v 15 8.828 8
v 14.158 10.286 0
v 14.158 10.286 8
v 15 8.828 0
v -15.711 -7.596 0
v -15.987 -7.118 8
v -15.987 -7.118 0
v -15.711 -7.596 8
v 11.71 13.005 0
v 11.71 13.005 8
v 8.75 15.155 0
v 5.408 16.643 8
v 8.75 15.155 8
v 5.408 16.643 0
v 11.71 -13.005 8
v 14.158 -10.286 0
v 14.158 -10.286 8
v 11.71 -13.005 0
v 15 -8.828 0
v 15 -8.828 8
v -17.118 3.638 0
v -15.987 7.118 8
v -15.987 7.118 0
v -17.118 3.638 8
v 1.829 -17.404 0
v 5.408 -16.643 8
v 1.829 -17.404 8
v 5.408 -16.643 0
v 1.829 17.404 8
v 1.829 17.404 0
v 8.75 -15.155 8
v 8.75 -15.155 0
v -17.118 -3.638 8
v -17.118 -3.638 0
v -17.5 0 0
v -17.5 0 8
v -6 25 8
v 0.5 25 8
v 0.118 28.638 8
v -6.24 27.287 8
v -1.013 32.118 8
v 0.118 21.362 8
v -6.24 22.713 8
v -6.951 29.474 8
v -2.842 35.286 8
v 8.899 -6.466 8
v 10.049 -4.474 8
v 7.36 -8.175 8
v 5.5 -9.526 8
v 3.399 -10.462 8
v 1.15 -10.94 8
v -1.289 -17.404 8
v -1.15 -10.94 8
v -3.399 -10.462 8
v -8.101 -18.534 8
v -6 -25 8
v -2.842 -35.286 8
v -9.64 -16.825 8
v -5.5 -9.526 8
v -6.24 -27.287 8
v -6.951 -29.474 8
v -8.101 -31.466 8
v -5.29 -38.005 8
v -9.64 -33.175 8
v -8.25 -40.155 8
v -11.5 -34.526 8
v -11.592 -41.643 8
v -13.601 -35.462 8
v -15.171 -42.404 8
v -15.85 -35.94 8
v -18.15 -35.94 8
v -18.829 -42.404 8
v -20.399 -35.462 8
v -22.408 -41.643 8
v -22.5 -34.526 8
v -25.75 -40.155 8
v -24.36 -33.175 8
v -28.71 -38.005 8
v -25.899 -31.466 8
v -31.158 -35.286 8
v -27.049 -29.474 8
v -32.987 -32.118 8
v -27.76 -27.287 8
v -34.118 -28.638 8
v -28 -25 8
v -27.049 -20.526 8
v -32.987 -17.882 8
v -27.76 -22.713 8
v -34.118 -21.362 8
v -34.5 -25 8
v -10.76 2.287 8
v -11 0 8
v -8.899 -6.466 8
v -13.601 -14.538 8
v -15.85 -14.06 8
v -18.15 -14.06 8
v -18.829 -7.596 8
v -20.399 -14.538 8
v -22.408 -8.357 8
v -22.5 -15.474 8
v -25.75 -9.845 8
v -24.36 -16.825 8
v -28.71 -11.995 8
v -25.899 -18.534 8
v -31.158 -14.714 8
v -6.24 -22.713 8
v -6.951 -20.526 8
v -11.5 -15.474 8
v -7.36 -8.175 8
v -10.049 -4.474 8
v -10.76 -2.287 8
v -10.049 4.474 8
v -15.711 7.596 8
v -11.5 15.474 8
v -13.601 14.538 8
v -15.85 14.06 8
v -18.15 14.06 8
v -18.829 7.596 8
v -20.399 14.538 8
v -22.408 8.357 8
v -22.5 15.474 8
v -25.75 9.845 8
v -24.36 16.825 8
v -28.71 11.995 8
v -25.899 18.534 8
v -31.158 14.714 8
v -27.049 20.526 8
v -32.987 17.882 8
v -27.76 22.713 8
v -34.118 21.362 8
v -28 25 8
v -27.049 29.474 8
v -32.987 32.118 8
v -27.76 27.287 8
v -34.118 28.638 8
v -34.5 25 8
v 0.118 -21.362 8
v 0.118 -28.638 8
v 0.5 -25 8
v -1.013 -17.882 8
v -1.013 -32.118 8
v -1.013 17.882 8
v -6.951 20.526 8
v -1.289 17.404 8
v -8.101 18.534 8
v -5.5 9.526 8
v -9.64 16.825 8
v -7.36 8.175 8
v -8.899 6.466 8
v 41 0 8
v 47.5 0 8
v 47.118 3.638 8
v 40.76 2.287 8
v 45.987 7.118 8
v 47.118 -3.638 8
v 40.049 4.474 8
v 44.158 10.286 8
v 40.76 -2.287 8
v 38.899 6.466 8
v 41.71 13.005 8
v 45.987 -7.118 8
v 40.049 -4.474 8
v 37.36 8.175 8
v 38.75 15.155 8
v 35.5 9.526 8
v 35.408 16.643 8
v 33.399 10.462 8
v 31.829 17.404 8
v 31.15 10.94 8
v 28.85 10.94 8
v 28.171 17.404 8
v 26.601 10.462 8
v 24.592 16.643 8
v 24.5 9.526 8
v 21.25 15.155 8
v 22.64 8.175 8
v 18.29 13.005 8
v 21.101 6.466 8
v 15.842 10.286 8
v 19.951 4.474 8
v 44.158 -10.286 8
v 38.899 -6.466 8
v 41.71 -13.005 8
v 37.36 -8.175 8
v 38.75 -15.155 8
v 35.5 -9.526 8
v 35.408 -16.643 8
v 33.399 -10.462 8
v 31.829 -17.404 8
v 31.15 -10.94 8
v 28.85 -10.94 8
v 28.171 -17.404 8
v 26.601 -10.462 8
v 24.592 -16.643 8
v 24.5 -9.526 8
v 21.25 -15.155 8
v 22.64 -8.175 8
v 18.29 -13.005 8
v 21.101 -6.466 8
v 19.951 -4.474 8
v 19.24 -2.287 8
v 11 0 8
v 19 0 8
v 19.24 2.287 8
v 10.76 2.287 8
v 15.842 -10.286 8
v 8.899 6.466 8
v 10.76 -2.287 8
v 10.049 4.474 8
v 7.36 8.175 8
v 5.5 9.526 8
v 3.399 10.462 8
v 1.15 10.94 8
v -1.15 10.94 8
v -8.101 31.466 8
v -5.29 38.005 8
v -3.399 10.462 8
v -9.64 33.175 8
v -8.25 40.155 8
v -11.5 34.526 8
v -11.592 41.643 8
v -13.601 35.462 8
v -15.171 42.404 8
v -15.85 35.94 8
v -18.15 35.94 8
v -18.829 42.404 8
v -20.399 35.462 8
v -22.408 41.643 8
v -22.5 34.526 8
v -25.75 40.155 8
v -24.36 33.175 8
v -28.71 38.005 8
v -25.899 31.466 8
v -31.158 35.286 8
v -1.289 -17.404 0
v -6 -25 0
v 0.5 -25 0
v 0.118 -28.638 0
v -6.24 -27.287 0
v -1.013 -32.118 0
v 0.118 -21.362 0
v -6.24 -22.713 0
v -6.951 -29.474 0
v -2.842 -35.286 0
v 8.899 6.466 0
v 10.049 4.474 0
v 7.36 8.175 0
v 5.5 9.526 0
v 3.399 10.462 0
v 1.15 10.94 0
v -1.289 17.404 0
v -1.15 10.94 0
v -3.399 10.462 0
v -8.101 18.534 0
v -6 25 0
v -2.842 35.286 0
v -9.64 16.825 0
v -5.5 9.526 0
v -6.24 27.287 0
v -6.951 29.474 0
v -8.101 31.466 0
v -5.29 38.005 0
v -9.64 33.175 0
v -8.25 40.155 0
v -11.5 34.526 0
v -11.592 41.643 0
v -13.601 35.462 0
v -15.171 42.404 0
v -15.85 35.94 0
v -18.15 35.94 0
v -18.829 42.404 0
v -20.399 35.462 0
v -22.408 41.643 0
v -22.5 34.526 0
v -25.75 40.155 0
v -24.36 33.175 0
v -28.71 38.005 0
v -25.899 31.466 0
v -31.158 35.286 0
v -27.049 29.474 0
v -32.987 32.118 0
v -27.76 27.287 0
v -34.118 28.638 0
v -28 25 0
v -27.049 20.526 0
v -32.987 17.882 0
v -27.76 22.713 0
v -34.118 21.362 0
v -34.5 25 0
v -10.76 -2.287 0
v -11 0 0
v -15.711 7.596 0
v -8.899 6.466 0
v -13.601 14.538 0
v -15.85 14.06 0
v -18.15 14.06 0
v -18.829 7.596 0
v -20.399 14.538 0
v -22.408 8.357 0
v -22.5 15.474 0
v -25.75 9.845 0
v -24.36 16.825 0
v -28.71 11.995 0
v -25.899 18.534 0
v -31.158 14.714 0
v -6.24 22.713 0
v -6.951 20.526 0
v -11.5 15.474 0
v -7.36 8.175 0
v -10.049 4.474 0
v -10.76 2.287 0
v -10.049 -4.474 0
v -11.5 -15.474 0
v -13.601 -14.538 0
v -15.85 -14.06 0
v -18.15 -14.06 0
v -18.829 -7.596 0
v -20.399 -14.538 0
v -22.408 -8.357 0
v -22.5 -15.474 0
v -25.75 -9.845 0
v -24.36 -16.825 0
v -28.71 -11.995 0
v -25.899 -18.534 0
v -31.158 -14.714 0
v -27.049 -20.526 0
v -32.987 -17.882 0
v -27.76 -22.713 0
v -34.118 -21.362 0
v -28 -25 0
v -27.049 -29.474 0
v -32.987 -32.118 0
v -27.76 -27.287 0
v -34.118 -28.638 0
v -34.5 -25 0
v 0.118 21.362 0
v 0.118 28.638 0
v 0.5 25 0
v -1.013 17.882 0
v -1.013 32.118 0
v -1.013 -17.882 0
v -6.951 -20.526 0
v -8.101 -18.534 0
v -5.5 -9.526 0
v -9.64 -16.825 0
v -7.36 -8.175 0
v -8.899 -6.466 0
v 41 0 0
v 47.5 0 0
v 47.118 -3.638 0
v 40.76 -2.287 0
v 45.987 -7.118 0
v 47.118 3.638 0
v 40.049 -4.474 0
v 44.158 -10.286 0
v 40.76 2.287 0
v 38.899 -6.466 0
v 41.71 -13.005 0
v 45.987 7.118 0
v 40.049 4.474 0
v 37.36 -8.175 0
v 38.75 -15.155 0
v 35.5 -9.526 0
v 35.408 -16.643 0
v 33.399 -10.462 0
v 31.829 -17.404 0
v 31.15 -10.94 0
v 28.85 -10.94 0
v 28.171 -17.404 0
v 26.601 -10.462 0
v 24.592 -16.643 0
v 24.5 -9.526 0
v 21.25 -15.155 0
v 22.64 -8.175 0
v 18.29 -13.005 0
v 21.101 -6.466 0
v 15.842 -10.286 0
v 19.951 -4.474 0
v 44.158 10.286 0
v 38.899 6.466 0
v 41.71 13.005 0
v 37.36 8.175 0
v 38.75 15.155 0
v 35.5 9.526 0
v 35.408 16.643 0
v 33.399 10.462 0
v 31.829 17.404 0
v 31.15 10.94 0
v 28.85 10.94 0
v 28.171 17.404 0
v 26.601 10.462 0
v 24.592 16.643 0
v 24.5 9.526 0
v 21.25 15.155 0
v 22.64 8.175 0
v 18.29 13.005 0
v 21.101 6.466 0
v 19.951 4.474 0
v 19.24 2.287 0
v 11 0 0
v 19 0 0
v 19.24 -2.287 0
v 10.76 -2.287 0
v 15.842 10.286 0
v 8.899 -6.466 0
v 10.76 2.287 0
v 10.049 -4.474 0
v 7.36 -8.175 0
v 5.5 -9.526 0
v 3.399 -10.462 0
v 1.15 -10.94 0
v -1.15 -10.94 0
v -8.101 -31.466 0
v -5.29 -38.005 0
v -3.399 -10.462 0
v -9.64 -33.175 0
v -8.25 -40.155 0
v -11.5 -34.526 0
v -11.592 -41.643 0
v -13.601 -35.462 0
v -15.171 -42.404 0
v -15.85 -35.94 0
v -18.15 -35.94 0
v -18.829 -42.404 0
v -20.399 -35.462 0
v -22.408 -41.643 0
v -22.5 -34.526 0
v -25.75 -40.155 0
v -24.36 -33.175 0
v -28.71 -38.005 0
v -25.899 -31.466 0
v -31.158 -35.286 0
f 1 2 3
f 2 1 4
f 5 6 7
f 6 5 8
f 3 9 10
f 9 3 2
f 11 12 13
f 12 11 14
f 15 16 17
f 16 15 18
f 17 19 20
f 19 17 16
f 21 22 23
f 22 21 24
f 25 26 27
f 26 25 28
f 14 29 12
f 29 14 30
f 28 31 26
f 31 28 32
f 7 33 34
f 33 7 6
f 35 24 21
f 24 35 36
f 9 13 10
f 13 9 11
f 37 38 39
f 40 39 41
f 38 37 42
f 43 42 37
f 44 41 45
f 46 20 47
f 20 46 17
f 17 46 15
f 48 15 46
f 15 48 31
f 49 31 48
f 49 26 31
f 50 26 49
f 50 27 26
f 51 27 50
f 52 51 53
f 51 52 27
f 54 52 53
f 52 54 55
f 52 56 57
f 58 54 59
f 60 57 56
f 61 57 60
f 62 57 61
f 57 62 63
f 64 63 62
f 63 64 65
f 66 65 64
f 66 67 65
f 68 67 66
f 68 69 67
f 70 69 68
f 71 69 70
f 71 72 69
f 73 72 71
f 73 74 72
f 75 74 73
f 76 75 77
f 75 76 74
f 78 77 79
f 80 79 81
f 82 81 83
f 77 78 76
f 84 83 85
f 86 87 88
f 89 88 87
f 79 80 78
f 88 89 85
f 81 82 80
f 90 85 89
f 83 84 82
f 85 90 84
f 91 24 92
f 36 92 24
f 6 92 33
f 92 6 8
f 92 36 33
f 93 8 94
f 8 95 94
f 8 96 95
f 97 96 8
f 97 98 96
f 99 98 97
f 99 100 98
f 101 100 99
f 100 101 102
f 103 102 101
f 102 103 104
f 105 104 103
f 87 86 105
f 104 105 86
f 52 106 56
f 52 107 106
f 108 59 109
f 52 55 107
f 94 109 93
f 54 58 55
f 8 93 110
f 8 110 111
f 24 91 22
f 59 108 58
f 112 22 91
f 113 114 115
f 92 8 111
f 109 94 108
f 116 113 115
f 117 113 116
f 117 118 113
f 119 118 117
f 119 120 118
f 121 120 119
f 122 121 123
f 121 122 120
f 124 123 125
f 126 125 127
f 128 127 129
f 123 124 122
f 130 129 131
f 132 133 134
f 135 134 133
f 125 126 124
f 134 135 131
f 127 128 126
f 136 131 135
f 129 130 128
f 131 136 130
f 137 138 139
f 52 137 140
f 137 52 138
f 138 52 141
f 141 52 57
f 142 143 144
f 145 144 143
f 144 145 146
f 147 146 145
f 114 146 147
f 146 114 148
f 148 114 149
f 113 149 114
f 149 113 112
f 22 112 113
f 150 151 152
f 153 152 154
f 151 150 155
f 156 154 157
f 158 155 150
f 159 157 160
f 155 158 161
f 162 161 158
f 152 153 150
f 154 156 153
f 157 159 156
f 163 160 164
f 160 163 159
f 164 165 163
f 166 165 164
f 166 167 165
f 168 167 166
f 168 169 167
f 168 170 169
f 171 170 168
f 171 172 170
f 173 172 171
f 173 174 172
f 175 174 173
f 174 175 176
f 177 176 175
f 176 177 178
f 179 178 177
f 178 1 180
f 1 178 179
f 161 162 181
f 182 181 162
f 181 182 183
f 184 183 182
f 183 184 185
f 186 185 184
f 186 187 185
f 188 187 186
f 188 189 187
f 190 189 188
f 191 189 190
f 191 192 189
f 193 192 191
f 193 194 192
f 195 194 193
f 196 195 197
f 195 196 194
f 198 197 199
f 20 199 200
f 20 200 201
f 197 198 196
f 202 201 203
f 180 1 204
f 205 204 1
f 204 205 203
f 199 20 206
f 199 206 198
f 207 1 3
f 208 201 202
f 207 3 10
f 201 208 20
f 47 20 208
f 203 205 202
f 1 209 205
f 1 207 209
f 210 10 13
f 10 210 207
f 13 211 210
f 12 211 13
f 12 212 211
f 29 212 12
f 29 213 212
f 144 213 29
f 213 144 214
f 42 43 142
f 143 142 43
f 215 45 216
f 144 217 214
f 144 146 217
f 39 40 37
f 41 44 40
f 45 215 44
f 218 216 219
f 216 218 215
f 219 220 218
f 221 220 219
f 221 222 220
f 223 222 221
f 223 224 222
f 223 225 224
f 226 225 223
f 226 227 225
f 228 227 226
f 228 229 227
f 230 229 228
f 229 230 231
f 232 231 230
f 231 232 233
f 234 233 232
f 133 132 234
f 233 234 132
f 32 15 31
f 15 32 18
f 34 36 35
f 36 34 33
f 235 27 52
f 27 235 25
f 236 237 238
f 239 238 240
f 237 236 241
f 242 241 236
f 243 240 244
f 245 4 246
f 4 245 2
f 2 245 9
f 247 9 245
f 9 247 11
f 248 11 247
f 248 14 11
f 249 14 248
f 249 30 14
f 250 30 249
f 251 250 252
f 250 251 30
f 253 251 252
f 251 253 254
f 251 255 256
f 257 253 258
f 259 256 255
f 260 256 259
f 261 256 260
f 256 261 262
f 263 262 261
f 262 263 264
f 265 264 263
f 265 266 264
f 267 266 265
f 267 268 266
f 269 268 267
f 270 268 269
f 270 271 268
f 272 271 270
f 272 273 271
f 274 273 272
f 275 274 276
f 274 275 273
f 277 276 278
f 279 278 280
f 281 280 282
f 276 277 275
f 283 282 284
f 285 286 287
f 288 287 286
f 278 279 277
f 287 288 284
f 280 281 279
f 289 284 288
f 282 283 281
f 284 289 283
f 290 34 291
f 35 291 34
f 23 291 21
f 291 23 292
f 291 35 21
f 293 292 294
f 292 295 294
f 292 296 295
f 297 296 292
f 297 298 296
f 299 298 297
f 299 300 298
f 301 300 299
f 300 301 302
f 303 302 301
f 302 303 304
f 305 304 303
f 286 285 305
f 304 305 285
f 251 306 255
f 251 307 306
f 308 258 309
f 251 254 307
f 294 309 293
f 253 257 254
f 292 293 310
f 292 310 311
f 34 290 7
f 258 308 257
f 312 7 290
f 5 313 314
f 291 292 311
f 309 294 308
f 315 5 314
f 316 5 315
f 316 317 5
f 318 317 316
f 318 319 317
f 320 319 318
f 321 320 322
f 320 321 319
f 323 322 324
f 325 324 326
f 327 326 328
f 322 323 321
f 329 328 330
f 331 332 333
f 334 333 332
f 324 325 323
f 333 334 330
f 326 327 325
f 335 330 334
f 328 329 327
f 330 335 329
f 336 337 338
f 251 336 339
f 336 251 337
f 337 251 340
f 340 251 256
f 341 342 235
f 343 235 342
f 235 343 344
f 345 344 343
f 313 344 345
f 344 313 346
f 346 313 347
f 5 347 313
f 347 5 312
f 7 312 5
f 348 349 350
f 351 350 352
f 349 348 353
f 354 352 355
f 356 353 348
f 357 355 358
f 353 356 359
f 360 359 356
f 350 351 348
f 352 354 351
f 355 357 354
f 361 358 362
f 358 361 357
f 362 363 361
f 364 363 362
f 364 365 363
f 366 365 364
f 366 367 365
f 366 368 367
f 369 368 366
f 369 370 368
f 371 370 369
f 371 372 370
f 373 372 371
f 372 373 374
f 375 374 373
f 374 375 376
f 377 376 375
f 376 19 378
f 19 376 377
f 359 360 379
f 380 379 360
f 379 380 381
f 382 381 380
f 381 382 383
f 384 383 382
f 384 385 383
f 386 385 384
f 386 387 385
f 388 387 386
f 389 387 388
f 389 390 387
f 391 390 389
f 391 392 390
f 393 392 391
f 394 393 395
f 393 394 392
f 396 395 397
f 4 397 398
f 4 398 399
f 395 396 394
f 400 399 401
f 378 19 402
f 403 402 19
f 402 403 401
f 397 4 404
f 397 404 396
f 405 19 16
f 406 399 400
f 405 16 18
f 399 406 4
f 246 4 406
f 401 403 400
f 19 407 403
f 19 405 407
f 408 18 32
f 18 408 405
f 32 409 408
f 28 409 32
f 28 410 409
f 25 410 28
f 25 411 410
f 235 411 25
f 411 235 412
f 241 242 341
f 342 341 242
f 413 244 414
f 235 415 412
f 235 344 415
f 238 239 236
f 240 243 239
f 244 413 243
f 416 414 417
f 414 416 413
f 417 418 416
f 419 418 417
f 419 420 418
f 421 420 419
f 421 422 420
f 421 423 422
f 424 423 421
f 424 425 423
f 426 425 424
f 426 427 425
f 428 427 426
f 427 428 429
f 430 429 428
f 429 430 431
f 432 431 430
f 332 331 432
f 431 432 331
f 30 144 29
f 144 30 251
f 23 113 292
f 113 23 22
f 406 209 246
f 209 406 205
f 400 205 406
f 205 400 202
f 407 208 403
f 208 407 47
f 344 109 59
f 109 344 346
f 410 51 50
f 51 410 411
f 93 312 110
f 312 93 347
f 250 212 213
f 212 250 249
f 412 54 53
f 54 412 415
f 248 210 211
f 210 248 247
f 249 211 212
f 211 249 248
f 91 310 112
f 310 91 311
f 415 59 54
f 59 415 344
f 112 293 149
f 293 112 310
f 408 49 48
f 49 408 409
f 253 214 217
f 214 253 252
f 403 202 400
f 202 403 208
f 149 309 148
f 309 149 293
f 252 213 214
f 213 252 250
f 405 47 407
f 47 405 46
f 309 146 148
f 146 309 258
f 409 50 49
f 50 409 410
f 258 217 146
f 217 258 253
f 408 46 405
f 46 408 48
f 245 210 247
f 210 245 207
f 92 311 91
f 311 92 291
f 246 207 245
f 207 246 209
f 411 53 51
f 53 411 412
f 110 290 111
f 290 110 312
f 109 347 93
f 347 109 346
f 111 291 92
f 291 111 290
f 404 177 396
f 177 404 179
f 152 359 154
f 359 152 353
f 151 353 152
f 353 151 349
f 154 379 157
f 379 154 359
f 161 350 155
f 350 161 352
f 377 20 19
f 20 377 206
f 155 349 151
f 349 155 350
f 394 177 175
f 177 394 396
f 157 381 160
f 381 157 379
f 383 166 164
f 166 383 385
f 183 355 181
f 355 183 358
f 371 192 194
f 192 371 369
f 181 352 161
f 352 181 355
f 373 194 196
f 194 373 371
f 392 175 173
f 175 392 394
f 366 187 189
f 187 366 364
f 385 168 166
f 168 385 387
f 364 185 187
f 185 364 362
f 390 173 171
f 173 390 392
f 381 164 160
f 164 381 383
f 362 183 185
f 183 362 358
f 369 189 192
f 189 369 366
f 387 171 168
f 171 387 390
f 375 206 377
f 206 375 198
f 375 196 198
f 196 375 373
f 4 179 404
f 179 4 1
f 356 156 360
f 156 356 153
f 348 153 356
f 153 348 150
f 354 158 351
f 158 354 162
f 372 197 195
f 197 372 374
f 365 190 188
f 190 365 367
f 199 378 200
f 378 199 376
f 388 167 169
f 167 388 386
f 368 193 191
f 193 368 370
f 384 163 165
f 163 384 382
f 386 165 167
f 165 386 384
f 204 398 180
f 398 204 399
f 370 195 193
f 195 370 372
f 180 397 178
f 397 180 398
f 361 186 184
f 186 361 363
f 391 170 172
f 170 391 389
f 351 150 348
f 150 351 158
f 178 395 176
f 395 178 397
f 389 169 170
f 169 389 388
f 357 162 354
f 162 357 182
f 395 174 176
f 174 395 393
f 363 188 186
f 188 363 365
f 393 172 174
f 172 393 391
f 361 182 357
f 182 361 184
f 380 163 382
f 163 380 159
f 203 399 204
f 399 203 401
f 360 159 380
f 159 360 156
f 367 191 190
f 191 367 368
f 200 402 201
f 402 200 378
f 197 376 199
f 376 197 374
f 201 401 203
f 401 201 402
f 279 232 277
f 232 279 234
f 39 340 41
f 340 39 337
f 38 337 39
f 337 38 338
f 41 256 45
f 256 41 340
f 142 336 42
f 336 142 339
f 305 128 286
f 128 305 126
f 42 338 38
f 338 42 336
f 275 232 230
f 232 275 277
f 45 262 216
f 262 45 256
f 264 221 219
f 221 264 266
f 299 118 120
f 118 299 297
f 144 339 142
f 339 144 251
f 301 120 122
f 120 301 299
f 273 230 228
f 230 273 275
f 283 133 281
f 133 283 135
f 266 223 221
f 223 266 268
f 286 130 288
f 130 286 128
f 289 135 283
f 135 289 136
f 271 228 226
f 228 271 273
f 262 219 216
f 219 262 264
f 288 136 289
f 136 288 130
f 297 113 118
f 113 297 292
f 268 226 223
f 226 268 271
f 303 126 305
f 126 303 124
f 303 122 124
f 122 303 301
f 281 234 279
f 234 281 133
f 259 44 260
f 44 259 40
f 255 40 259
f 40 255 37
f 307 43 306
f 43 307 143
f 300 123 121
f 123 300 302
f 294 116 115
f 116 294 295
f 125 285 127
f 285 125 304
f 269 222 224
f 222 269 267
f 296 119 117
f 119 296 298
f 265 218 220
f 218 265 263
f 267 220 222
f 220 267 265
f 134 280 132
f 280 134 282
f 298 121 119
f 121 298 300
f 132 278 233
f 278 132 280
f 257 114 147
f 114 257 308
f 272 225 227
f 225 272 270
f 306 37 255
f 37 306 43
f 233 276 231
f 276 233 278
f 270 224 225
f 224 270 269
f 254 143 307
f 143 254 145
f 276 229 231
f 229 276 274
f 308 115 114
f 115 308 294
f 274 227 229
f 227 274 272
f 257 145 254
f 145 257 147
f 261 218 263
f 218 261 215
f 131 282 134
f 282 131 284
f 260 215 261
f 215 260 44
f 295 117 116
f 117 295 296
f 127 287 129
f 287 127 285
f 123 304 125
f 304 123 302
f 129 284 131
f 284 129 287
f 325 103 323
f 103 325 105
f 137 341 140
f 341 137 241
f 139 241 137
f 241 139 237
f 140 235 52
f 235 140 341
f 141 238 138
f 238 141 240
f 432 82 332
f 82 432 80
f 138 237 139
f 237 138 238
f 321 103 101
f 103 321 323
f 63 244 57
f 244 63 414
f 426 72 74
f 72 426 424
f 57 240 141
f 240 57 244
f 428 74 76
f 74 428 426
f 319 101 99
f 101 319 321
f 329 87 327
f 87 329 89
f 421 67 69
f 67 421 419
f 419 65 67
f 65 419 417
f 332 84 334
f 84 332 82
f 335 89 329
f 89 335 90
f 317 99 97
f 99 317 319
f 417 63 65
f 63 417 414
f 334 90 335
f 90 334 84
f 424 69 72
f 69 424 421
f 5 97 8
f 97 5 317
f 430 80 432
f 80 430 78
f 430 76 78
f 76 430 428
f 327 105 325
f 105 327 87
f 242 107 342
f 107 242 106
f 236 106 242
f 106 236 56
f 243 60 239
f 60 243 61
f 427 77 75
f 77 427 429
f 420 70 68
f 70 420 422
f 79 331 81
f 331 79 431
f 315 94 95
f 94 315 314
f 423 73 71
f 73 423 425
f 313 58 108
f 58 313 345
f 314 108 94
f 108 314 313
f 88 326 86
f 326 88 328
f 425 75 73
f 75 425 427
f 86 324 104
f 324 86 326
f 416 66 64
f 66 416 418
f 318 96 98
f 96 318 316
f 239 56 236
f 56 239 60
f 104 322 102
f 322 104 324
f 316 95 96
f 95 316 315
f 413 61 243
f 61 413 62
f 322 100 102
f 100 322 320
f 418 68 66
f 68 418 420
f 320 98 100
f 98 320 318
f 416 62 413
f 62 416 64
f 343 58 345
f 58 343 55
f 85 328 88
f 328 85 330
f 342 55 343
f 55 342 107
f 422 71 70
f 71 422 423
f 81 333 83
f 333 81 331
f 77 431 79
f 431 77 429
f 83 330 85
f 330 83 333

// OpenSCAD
difference()
{
    cylinder(d=35,h=8);
    translate([0,0,-5]) cylinder(d=22,h=15);
}
translate([30,0,0]) difference()
{
    cylinder(d=35,h=8);
    translate([0,0,-5]) cylinder(d=22,h=15);
}
translate([-17,25,0]) difference()
{
    cylinder(d=35,h=8);
    translate([0,0,-5]) cylinder(d=22,h=15);
}
translate([-17,-25,0]) difference()
{
    cylinder(d=35,h=8);
    translate([0,0,-5]) cylinder(d=22,h=15);
}
